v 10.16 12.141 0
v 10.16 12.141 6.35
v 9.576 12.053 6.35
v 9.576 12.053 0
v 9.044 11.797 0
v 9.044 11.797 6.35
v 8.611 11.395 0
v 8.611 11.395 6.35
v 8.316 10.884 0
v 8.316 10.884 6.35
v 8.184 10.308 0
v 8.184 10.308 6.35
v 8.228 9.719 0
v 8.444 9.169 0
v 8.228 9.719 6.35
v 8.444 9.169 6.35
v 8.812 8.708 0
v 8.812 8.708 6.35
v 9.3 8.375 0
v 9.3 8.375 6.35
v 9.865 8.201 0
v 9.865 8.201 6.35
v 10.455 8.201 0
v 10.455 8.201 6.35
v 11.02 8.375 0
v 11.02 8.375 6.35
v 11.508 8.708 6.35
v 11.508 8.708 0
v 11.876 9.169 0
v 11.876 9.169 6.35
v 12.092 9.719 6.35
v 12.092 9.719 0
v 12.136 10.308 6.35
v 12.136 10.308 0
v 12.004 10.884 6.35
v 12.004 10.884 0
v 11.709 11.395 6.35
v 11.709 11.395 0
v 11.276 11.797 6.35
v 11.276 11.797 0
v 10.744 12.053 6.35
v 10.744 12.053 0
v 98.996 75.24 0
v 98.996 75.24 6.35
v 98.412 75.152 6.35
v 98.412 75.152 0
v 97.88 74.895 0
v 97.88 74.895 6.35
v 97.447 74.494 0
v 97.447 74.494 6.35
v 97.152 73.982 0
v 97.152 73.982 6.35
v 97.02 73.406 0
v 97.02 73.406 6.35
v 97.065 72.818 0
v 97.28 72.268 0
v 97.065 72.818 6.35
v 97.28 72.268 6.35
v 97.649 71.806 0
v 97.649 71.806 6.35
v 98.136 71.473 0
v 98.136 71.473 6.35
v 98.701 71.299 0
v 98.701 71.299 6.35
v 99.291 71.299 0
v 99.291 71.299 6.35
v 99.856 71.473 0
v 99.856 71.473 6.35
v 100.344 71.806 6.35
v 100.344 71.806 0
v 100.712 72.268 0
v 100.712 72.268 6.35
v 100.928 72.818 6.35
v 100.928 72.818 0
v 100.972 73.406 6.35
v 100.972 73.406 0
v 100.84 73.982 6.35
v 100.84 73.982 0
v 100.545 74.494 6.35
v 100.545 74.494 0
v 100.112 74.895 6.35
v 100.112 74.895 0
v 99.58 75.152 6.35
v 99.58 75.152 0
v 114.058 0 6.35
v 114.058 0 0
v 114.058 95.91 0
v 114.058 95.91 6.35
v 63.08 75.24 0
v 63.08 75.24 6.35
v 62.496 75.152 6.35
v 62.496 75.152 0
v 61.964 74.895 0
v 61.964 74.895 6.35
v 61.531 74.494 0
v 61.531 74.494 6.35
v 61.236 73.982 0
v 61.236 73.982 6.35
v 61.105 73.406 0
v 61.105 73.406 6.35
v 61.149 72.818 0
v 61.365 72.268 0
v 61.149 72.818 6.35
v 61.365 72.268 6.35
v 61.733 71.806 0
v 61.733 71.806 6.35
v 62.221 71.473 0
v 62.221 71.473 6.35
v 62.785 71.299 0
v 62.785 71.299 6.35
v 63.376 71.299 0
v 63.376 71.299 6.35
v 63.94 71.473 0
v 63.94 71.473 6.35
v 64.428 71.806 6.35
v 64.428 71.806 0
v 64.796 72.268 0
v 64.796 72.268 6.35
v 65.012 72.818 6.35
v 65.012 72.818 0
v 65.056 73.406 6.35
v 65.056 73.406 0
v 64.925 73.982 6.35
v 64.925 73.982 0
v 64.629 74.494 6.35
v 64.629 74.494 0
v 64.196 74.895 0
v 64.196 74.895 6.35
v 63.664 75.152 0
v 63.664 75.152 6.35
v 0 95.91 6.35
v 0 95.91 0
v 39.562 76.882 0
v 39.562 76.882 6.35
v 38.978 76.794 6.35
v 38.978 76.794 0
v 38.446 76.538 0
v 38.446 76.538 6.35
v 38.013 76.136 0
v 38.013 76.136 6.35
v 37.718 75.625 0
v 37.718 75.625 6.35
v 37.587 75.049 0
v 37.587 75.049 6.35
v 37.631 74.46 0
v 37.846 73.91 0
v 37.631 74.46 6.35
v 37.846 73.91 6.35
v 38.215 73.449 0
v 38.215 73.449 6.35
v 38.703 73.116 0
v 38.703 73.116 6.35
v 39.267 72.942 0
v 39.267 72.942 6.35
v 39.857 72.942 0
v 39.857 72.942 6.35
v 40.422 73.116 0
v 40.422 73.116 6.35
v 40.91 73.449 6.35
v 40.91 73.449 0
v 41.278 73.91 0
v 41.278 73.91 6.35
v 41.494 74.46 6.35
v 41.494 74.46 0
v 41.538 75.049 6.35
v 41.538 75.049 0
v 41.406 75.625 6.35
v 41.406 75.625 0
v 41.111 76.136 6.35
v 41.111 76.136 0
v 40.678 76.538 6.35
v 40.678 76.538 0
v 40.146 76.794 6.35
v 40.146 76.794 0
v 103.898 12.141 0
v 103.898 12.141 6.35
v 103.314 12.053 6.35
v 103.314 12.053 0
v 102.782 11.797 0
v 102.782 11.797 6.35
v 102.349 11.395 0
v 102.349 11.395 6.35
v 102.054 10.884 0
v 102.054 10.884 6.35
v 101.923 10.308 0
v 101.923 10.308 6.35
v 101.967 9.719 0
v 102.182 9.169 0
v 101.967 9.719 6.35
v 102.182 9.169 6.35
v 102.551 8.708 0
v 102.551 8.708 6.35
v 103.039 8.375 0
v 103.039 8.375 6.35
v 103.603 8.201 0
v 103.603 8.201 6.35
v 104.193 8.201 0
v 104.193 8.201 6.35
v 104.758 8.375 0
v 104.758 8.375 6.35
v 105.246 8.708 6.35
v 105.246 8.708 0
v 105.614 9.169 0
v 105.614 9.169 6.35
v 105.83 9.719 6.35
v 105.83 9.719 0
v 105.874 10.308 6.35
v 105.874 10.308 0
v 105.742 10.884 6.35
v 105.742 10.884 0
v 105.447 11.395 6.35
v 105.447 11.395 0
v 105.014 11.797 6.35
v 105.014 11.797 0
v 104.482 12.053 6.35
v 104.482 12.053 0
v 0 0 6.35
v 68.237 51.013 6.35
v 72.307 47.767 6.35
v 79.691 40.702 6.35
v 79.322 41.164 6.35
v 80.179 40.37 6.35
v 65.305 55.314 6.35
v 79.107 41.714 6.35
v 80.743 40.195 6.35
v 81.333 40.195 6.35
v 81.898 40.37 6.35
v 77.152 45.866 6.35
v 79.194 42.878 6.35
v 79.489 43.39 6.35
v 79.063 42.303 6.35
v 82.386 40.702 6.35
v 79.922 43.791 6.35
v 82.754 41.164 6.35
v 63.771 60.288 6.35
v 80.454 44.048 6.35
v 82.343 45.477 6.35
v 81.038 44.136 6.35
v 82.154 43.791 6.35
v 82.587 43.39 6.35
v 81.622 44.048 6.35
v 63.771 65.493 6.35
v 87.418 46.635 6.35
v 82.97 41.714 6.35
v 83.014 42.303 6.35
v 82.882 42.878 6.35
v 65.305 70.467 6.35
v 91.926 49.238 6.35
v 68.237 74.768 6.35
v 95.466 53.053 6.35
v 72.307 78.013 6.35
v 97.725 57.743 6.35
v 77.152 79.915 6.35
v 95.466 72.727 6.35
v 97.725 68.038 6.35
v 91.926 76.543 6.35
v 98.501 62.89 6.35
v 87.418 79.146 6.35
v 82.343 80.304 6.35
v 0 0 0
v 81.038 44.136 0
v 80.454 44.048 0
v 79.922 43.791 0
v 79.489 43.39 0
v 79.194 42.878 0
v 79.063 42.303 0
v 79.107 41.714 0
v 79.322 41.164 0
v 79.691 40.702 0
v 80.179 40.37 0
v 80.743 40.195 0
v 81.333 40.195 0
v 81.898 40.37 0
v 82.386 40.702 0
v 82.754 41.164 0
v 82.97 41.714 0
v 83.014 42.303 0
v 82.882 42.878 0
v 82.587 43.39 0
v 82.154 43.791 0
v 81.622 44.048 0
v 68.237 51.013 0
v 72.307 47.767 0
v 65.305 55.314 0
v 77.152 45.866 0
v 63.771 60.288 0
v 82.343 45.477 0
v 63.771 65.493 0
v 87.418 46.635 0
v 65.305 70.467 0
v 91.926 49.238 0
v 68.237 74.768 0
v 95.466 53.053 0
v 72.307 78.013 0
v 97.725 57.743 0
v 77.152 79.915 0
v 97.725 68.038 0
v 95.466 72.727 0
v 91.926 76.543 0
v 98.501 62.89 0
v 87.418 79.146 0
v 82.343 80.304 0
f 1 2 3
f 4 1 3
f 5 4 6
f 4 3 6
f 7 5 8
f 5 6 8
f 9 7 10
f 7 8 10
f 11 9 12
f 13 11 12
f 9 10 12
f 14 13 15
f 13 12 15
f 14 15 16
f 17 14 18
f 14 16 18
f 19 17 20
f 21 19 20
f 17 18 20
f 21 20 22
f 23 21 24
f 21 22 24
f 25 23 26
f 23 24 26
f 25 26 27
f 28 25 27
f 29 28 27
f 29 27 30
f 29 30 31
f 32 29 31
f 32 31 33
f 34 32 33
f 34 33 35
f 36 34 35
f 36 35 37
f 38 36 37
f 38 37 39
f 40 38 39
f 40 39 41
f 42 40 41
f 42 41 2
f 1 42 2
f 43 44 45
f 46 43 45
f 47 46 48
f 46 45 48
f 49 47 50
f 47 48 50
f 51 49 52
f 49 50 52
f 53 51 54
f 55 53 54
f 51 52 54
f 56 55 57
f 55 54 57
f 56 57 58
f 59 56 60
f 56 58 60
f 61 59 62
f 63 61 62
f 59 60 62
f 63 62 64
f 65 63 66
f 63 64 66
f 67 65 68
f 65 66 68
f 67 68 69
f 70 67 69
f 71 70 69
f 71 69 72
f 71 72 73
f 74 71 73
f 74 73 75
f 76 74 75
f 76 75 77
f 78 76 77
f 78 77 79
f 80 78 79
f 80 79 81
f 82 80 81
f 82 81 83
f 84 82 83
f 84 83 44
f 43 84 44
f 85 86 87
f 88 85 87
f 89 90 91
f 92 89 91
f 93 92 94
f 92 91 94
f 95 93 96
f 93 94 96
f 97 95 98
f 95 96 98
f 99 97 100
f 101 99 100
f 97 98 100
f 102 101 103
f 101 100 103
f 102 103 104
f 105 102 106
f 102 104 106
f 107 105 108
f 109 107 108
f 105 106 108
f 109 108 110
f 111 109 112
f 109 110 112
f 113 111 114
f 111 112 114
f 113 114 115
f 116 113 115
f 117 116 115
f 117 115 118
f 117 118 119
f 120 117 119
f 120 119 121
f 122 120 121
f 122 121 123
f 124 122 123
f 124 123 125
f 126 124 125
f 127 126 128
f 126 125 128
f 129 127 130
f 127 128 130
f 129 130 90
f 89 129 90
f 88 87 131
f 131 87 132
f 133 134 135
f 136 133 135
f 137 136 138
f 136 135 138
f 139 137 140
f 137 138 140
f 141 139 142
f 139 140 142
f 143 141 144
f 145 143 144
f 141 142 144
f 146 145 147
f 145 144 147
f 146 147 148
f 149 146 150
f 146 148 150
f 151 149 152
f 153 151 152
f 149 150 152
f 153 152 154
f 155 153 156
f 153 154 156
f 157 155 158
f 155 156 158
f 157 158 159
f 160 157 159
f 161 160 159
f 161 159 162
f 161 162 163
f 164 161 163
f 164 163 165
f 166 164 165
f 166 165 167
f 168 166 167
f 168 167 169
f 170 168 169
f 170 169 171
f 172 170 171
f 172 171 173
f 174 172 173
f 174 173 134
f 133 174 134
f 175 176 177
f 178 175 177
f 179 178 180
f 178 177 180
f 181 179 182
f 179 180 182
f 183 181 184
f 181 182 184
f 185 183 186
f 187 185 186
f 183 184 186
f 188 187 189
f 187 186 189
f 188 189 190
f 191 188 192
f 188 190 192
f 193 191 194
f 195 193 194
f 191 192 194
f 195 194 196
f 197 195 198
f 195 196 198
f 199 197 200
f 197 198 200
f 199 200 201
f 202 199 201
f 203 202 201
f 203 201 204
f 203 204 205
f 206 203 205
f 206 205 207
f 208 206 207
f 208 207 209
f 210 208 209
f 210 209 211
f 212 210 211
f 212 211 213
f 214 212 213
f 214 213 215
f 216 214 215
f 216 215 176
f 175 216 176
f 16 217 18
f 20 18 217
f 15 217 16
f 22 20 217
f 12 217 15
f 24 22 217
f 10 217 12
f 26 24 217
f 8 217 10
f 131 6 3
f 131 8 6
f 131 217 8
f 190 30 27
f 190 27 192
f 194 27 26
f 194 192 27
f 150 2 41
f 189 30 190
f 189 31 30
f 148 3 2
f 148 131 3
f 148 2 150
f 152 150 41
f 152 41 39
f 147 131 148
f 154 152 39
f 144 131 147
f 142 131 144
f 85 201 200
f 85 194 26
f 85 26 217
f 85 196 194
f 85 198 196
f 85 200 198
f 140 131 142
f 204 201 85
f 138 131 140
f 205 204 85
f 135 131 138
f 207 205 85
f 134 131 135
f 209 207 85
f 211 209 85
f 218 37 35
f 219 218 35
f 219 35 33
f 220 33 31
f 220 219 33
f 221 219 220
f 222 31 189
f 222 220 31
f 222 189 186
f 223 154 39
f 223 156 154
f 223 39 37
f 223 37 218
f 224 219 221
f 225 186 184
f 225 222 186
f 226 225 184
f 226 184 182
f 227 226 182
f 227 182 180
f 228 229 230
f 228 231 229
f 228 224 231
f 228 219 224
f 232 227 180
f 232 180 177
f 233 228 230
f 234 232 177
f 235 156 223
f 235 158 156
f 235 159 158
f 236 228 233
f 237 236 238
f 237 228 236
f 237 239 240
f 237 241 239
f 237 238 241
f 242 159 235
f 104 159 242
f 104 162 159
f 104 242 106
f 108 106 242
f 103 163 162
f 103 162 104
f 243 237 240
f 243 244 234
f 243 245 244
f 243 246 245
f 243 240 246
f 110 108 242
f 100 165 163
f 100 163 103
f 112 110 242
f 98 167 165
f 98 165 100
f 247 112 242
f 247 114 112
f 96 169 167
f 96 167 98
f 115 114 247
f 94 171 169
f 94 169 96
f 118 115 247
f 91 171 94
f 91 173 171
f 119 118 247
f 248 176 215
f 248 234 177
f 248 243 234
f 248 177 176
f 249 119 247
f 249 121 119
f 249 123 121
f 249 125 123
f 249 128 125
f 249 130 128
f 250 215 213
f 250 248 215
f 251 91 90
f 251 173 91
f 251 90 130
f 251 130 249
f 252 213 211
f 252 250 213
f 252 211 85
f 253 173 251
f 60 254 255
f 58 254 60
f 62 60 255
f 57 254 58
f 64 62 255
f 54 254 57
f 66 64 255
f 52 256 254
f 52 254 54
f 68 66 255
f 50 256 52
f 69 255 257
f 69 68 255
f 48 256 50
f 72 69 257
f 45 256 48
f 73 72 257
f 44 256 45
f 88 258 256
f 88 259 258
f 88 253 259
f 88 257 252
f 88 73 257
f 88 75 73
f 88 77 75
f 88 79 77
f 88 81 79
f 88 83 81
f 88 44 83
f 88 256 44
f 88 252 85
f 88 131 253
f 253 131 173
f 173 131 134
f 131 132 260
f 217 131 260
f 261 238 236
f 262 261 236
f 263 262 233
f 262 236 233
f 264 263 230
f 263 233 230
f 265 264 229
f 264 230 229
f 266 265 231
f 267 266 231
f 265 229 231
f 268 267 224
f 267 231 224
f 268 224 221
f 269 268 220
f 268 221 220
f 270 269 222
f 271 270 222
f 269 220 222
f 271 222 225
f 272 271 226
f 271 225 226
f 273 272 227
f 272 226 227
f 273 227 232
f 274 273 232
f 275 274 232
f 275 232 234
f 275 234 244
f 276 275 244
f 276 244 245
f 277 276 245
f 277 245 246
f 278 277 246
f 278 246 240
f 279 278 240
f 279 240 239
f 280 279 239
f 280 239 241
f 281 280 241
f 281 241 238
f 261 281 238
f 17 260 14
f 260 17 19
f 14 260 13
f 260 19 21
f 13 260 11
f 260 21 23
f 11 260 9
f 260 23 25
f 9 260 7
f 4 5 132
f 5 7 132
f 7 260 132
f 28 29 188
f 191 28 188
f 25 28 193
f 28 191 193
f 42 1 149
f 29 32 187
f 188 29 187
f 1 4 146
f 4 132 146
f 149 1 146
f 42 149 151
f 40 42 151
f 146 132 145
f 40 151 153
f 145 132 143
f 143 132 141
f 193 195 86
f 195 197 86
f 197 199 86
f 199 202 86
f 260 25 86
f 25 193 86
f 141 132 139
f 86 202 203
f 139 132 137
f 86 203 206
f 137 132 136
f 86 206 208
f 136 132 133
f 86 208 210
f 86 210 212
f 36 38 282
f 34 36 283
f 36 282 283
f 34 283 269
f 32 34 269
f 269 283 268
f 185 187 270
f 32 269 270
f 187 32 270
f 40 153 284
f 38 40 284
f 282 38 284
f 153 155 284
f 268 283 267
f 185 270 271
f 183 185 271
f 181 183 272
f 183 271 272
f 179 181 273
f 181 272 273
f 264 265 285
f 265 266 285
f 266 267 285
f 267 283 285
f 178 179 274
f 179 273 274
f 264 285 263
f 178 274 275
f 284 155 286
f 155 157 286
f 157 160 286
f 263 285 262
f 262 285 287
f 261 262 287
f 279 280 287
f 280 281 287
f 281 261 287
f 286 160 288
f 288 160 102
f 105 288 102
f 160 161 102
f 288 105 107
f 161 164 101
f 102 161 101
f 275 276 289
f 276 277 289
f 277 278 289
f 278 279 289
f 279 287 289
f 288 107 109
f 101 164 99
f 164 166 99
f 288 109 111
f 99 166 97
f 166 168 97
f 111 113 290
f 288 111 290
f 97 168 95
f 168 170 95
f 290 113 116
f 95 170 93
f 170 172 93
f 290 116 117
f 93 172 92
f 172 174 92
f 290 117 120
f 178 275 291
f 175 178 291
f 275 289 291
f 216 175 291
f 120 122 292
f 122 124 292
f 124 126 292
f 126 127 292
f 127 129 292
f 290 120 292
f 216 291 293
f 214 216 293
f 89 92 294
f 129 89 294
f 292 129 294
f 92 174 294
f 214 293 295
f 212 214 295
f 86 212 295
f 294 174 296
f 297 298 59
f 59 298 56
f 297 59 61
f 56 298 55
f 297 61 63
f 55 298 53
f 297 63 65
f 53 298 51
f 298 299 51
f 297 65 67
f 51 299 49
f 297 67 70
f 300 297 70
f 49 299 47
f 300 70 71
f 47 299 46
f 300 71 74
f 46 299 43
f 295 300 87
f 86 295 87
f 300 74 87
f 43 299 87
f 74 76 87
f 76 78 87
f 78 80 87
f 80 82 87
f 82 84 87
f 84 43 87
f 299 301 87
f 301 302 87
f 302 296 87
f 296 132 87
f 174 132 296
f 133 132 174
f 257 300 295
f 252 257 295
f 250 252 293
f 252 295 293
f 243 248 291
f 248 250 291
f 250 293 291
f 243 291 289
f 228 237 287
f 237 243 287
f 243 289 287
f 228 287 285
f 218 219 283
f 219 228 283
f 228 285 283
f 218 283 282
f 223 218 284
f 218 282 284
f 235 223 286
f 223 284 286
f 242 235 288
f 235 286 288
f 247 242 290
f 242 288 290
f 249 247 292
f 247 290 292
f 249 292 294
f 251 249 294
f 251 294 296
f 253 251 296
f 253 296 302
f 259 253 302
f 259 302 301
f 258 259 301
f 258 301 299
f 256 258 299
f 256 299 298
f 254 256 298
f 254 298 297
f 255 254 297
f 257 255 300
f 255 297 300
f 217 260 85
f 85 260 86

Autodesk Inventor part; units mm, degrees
sketch "Sketch1" plane through (0, 0, 0) normal (0, 0, 1) x (1, 0, 0)
  line L0 (0, 0) -> (114.0582, 0)
  line L1 (114.0582, 0) -> (114.0582, 95.9104)
  line L2 (114.0582, 95.9104) -> (0, 95.9104)
  line L3 (0, 95.9104) -> (0, 0)
  line L4 (59.1, 17.1) -> (59.1, 59.1) construction
  line L5 (59.1, 59.1) -> (17.1, 59.1) construction
  line L6 (17.1, 59.1) -> (17.1, 17.1) construction
  line L7 (17.1, 17.1) -> (59.1, 17.1) construction
  line L8 (59.1, 17.1) -> (17.1, 59.1) construction
  line L9 (59.1, 59.1) -> (17.1, 17.1) construction
  circle A0 centre (38.1, 38.1) radius 38.1 construction
  circle A1 centre (38.1, 38.1) radius 20.2 construction
  line L10 (45.4323, 38.1) -> (41.7662, 31.75) construction
  line L11 (41.7662, 31.75) -> (34.4338, 31.75) construction
  line L12 (34.4338, 31.75) -> (30.7677, 38.1) construction
  line L13 (30.7677, 38.1) -> (34.4338, 44.45) construction
  line L14 (34.4338, 44.45) -> (41.7662, 44.45) construction
  line L15 (41.7662, 44.45) -> (45.4323, 38.1) construction
  circle A2 centre (38.1, 38.1) radius 21.59 construction
  line L16 (38.1, 38.1) -> (81.0382, 62.8904) construction
  circle A3 centre (81.0382, 62.8904) radius 27.94 construction
  circle A4 centre (81.0382, 62.8904) radius 23.8125 construction
  circle A5 centre (81.0382, 62.8904) radius 17.4625
  circle A6 centre (38.1, 38.1) radius 14.2875 construction
  line L17 (85.0105, 18.6054) -> (38.1, 38.1) construction
  circle A7 centre (81.0382, 62.8904) radius 33.02 construction
  circle A8 centre (38.1, 38.1) radius 25.4 construction
  circle A9 centre (38.1, 38.1) radius 9.525 construction
  line L18 (81.0382, 62.8904) -> (81.0382, 42.1545) construction
  circle A10 centre (81.0382, 42.1545) radius 2.0828 construction
  circle A11 centre (39.5622, 74.901) radius 10.16 construction
  circle A12 centre (39.5622, 74.901) radius 6.35 construction
  circle A13 centre (81.0382, 42.1545) radius 6.35 construction
  circle A14 centre (38.1, 38.1) radius 26.67 construction
  line L19 (85.0105, 18.6054) -> (87.4474, 24.4692) construction
  line L20 (85.0105, 18.6054) -> (82.5737, 12.7416) construction
  line L21 (87.4474, 24.4692) -> (77.6267, 28.5504) construction
  line L22 (82.5737, 12.7416) -> (72.2567, 17.029) construction
  circle A15 centre (103.8982, 10.16) radius 10.16 construction
  circle A16 centre (103.8982, 10.16) radius 6.35 construction
  circle A17 centre (10.16, 10.16) radius 10.16 construction
  circle A18 centre (38.1, 38.1) radius 32.258 construction
  circle A19 centre (10.16, 10.16) radius 6.35 construction
  point P0 (20.1395, 56.0605)
  point P1 (56.0605, 20.1395)
  point P2 (81.0382, 44.2373)
  point P3 (81.0382, 45.4279)
  point P4 (98.9961, 73.2584)
  point P5 (63.0804, 73.2584)
  point P6 (81.0382, 48.5045)
  point P7 (79.1467, 21.0422)
  dimension "d10" = 34.925
  dimension "d17" = 4.1656
  dimension "d25" = 12.7
  dimension "d0" = 42
  dimension "d1" = 42
  dimension "d2" = 76.2
  dimension "d3" = 40.4
  dimension "d4" = 12.7
  dimension "d5" = 43.18
  dimension "d6" = 55.88
  dimension "d7" = 49.5808
  dimension "d8" = 47.625
  dimension "d11" = 28.575
  dimension "d13" = 30
  dimension "d14" = 5.08
  dimension "d15" = 50.8
  dimension "d16" = 19.05
  dimension "d18" = 1.1906
  dimension "d21" = 360
  dimension "d23" = 20.32
  dimension "d24" = 12.7
  dimension "d26" = 3.0766
  dimension "d30" = 5.08
  dimension "d33" = 50.8
  dimension "d34" = 6.35
  dimension "d35" = 6.35
  dimension "d36" = 20.32
  dimension "d37" = 64.516
  dimension "d38" = 12.7
ref_plane "Work Plane1" through (0, 0, -6.35) normal (0, 0, 1) x (1, 0, 0)
ref_plane "Work Plane2" through (0, 0, -41.875) normal (0, 0, 1) x (1, 0, 0)
ref_plane "Work Plane3" through (0, 0, -35.525) normal (0, 0, 1) x (1, 0, 0)
ref_plane "Work Plane4" through (0, 0, -92.675) normal (0, 0, 1) x (1, 0, 0)
ref_plane "Work Plane5" through (0, 0, -99.025) normal (0, 0, 1) x (1, 0, 0)
sketch "Sketch2" plane through (0, 0, -6.35) normal (0, 0, 1) x (1, 0, 0)
  line L0 (114.0582, 95.9104) -> (0, 95.9104) projected
  line L1 (0, 95.9104) -> (0, 0) projected
  line L2 (0, 0) -> (114.0582, 0) projected
  line L3 (114.0582, 0) -> (114.0582, 95.9104) projected
  circle A0 centre (81.0382, 62.8904) radius 17.4625 projected
  circle A1 centre (38.1, 38.1) radius 9.525 projected
sketch "Sketch3" plane through (0, 0, -41.875) normal (0, 0, 1) x (1, 0, 0)
  line L0 (114.0582, 95.9104) -> (0, 95.9104) projected
  line L1 (114.0582, 0) -> (114.0582, 95.9104) projected
  circle A0 centre (81.0382, 62.8904) radius 17.4625 projected
  line L2 (0, 0) -> (114.0582, 0) projected
  line L3 (0, 95.9104) -> (0, 0) projected
  circle A1 centre (38.1, 38.1) radius 14.2875 projected
sketch "Sketch4" plane through (0, 0, -35.525) normal (0, 0, 1) x (1, 0, 0)
  line L0 (114.0582, 95.9104) -> (0, 95.9104) projected
  line L1 (0, 95.9104) -> (0, 0) projected
  line L2 (0, 0) -> (114.0582, 0) projected
  line L3 (114.0582, 0) -> (114.0582, 95.9104) projected
  circle A0 centre (81.0382, 62.8904) radius 17.4625 projected
  circle A1 centre (38.1, 38.1) radius 14.2875 projected
sketch "Sketch5" plane through (0, 0, -92.675) normal (0, 0, 1) x (1, 0, 0)
  line L0 (0, 95.9104) -> (0, 0) projected
  line L1 (114.0582, 95.9104) -> (0, 95.9104) projected
  line L2 (0, 0) -> (114.0582, 0) projected
  line L3 (114.0582, 0) -> (114.0582, 95.9104) projected
  circle A0 centre (81.0382, 62.8904) radius 17.4625 projected
sketch "Sketch6" plane through (0, 0, -99.025) normal (0, 0, 1) x (1, 0, 0)
  line L0 (0, 95.9104) -> (0, 0) projected
  line L1 (0, 0) -> (114.0582, 0) projected
  line L2 (114.0582, 0) -> (114.0582, 95.9104) projected
  line L3 (114.0582, 95.9104) -> (0, 95.9104) projected
  circle A0 centre (81.0382, 62.8904) radius 17.4625 projected
extrude "Extrusion1" add sketch "Sketch1" along normal blind 6.35
hole "Hole1" at (81.0382, 42.1545, 0) at (98.9961, 73.2584, 0) at (63.0804, 73.2584, 0) direction (0, 0, 1) diameter 3.9624 end through all thread size "10-32 UNF" class "2B" standard "ANSI Unified Screw Threads"
hole "Hole2" at (39.5622, 74.901, 0) at (10.16, 10.16, 0) at (103.8982, 10.16, 0) direction (0, 0, 1) diameter 3.9624 end through all thread size "10-32 UNF" class "2B" standard "ANSI Unified Screw Threads"
equation "\"d30\" = d14"
properties part number "Main Outline"
